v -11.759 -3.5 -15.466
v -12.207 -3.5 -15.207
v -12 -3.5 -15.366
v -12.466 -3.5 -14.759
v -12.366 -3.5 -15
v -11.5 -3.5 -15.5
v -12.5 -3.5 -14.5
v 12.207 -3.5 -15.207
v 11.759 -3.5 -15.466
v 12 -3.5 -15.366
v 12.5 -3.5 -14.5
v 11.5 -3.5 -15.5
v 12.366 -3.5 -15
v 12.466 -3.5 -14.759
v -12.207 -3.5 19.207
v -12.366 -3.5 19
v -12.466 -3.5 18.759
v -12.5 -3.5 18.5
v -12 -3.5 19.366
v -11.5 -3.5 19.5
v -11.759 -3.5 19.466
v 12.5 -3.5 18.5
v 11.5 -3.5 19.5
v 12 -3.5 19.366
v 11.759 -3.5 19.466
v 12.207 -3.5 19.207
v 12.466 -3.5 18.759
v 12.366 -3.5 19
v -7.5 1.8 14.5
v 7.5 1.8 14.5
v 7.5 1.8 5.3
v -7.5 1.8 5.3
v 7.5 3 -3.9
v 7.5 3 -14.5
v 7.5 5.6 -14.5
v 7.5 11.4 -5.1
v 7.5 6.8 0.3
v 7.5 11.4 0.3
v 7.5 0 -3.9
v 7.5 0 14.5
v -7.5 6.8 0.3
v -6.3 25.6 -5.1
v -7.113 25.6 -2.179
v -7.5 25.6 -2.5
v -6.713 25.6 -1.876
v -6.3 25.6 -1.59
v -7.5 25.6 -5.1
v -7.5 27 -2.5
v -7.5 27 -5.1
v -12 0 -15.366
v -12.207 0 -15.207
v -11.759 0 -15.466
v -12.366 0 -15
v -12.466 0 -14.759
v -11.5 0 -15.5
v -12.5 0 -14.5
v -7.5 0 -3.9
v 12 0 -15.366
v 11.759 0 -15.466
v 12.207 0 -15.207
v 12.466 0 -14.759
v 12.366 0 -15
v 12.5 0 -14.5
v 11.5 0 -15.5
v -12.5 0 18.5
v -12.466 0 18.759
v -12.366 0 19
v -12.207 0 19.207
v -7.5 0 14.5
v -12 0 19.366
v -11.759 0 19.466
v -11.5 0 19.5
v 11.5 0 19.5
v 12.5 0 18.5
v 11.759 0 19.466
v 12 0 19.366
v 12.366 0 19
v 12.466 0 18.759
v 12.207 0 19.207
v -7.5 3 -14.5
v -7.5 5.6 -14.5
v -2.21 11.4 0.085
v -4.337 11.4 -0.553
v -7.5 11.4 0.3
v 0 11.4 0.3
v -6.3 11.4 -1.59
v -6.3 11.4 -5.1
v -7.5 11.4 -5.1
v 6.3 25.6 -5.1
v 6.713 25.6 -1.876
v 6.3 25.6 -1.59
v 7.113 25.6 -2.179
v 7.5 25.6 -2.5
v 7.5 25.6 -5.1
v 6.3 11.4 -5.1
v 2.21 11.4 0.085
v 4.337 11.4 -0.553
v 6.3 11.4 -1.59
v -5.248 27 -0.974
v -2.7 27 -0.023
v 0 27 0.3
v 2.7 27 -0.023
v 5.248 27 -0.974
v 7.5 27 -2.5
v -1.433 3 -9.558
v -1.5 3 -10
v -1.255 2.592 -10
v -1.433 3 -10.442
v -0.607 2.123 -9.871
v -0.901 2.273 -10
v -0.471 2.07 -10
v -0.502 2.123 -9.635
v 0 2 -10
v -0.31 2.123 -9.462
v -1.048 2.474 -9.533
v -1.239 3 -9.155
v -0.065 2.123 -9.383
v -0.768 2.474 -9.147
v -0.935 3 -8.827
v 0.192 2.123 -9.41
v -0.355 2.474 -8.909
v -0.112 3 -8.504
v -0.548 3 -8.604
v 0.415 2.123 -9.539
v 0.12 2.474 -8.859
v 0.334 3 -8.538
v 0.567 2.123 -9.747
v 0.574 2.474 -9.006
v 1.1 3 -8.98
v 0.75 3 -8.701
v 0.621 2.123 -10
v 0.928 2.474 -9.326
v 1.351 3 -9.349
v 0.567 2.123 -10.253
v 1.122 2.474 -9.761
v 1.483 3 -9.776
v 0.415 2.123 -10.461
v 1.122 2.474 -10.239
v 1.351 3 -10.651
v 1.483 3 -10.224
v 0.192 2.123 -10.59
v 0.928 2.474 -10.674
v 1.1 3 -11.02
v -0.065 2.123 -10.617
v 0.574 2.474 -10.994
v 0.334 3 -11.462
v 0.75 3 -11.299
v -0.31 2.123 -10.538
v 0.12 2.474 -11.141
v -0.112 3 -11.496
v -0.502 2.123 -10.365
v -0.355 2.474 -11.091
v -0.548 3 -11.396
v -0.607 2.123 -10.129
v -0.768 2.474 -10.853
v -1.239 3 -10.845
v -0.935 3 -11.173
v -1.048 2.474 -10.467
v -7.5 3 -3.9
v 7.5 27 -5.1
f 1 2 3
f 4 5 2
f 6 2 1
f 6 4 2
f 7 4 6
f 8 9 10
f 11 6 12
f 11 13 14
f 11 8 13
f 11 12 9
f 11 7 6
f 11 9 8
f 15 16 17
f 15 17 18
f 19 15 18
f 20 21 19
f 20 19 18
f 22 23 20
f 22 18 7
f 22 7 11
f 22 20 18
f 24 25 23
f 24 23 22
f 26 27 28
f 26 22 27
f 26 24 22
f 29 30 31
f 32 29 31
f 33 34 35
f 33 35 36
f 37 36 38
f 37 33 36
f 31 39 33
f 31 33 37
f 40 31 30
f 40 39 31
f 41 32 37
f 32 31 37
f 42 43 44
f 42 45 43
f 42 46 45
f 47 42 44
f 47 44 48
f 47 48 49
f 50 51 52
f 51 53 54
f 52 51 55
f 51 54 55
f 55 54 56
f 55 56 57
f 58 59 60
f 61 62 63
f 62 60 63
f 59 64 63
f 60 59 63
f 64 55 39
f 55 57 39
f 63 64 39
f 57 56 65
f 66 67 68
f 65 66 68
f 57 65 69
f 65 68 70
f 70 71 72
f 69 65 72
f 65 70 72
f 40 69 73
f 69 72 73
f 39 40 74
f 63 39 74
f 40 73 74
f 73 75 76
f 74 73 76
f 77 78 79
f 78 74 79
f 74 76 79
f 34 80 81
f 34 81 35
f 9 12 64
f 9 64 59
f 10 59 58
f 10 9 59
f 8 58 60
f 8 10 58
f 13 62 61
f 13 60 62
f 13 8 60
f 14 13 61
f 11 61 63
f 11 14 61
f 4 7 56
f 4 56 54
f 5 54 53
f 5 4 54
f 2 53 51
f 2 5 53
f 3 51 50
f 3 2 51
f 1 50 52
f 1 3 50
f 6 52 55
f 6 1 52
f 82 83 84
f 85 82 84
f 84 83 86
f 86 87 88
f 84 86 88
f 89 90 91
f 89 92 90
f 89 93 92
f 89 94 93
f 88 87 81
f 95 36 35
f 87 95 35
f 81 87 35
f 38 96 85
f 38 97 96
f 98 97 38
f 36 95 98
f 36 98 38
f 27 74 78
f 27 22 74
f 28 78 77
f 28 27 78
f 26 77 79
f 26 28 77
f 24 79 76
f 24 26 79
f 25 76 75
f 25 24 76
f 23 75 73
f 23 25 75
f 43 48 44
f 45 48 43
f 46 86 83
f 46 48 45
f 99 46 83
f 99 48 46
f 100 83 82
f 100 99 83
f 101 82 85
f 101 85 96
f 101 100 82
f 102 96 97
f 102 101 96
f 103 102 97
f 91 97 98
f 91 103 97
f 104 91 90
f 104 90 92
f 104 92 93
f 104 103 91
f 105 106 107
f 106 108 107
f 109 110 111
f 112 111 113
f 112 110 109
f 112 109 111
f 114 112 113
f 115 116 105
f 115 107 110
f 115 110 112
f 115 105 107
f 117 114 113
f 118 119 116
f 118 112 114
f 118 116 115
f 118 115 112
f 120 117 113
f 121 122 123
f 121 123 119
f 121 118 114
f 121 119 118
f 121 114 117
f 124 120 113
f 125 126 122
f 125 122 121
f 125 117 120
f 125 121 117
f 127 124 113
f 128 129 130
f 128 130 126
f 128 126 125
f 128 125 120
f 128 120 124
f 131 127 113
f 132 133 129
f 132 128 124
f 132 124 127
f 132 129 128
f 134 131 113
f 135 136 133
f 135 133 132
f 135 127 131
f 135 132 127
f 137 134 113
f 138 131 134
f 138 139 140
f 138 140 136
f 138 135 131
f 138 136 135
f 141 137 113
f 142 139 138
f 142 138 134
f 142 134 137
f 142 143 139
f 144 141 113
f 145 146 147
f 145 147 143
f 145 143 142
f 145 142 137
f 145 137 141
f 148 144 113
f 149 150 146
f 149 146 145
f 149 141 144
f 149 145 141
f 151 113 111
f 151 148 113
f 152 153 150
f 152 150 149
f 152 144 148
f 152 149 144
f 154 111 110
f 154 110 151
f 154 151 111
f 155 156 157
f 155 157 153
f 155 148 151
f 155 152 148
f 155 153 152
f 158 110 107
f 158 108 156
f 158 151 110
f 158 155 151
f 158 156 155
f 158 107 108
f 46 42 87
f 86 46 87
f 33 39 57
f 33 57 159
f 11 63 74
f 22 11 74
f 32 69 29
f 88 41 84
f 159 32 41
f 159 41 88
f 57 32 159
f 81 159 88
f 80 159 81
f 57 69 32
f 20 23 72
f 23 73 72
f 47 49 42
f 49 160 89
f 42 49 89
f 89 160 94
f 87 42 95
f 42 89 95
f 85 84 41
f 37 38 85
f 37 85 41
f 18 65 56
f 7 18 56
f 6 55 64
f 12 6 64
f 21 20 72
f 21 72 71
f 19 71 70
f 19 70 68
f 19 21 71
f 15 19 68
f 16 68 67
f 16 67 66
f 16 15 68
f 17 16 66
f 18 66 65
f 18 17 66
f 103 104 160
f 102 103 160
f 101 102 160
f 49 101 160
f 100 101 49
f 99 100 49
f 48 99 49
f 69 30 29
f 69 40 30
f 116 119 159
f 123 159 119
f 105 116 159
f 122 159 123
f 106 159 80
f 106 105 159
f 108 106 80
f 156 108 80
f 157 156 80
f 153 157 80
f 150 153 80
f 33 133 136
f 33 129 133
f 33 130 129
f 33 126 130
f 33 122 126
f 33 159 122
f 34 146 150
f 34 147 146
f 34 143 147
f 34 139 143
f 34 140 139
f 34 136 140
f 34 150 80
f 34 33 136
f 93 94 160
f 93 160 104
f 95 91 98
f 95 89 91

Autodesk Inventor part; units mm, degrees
ref_plane "YZ Plane" through (0, 0, 0) normal (1, 0, 0) x (0, 1, 0)
ref_plane "XZ Plane" through (0, 0, 0) normal (0, 1, 0) x (-1, 0, 0)
sketch "Эскиз1" plane through (0, 0, 0) normal (0, 1, 0) x (-1, 0, 0)
  line L0 (-7.5, 14.5) -> (7.5, 14.5)
  line L1 (7.5, 14.5) -> (7.5, -14.5)
  line L2 (7.5, -14.5) -> (-7.5, -14.5)
  line L3 (-7.5, -14.5) -> (-7.5, 14.5)
  line L4 (-7.5, 14.5) -> (7.5, -14.5) construction
  line L5 (7.5, 14.5) -> (-7.5, -14.5) construction
  point P0 (0, 0)
  dimension "d0" = 15
  dimension "d1" = 29
extrude "Выдавливание1" add sketch "Эскиз1" along normal blind 27
sketch "Эскиз2" plane through (0, 0, 0) normal (0, -1, 0) x (1, 0, 0)
  line L0 (12.5, 19.5) -> (-12.5, 19.5)
  line L1 (-12.5, 19.5) -> (-12.5, -15.5)
  line L2 (-12.5, -15.5) -> (12.5, -15.5)
  line L3 (12.5, -15.5) -> (12.5, 19.5)
  line L4 (7.5, 14.5) -> (7.5, -14.5) projected
  line L5 (-7.5, 14.5) -> (7.5, 14.5) projected
  point P0 (0, 0)
  dimension "d4" = 25
  dimension "d5" = 35
  dimension "d6" = 5
  dimension "d7" = 5
extrude "Выдавливание2" add sketch "Эскиз2" along normal blind 3.5
fillet "Сопряжение1" radius 1 1 edges at (-12.5, -1.75, 19.5)
fillet "Сопряжение2" radius 1 2 edges at (12.5, -1.75, 19.5) (12.5, -1.75, -15.5)
fillet "Сопряжение3" radius 1 1 edges at (-12.5, -1.75, -15.5)
sketch "Эскиз3" plane through (7.5, 27, 14.5) normal (1, 0, 0) x (0, 0, -1)
  line L0 (14.2, 0) -> (14.2, -20.2)
  line L1 (0, -27) -> (0, 0) projected
  line L2 (0, 0) -> (29, 0) projected
  line L3 (29, -27) -> (-4, -27) projected
  line L4 (-4, -27) -> (29, -27) projected
  line L5 (18.4, -27) -> (18.4, -24)
  line L6 (18.4, -24) -> (29, -24)
  line L7 (29, -27) -> (29, 0) projected
  line L8 (29, 0) -> (0, 0) projected
  line L9 (19.6, 0) -> (19.6, -15.6)
  line L10 (19.6, -15.6) -> (29, -21.4)
  line L11 (0, -25.2) -> (9.2, -25.2)
  line L12 (9.2, -25.2) -> (14.2, -20.2)
  point P0 (14.5, -27)
  dimension "d17" = 3
  dimension "d18" = 9.4
  dimension "d43" = 5
extrude "Выдавливание3" cut sketch "Эскиз3" against normal blind 23 contours L0 L12 L11 L1 L2 | L2 L7 L10 L9 | L5 L6 L7 L3
sketch "Эскиз5" plane through (0, 27, 0) normal (0, 1, 0) x (1, 0, 0)
  line L0 (-7.5, 3.9) -> (-7.5, -14.5) projected
  line L1 (7.5, -14.5) -> (7.5, 3.9) projected
  arc A0 (-7.5, 2.5) -> (7.5, 2.5) centre (0, 11.1446) ccw
  line L2 (-7.5, -0.3) -> (7.5, -0.3) projected
  line L3 (7.5, 5.1) -> (-7.5, 5.1) projected
  point P0 (0, 0)
  point P1 (0, -0.3)
  dimension "d23" = 2.6
  dimension "d24" = 2.6
extrude "Выдавливание4" cut sketch "Эскиз5" against normal blind 15.6
sketch "Эскиз6" plane through (7.5, 11.4, -5.1) normal (0, 0, -1) x (-1, 0, 0)
  line L0 (0, 0) -> (0, 15.6) projected
  line L1 (0, 15.6) -> (15, 15.6) projected
  line L2 (0, 14.2) -> (1.2, 14.2)
  line L3 (1.2, 14.2) -> (1.2, 0)
  line L4 (1.2, 0) -> (0, 0)
  line L5 (0, 0) -> (0, 14.2)
  line L6 (15, 0) -> (15, 15.6)
  line L7 (13.8, 14.2) -> (13.8, 0)
  line L8 (13.8, 0) -> (15, 0)
  line L9 (0, 14.2) -> (1.2, 14.2)
  line L10 (13.8, 14.2) -> (15.1024, 14.2)
  point P0 (7.5, -11.4)
  point P1 (15, 14.2)
  dimension "d28" = 1.2
extrude "Выдавливание5" cut sketch "Эскиз6" against normal blind 16
sketch "Эскиз7" plane through (7.5, 3, -14.5) normal (0, -1, 0) x (1, 0, 0)
  line L0 (0, 0) -> (0, 9.4) projected
  line L1 (0, 4.5) -> (-15, 4.5)
  line L2 (-15, 0) -> (-15, 10.6) projected
  line L3 (0, 0) -> (-15, 0) projected
  point P0 (-7.5, 14.5)
  dimension "d36" = 4.5
ref_plane "РабПлоскость1" through (-7.5, 3, -10) normal (0, 0, -1) x (-1, 0, 0)
sketch "Эскиз8" plane through (-7.5, 3, -10) normal (0, 0, -1) x (-1, 0, 0)
  line L0 (-15, 0) -> (0, 0) projected
  arc A0 (-7.5, -1) -> (-6, 0) centre (-7.5, 0.625) ccw
  line L1 (-15, 0) -> (0, 0) projected
  line L2 (-7.5, 0) -> (-7.5, -1.5688)
  point P0 (-7.5, -3)
  point P1 (-9, 0)
revolve "Вращение2" add sketch "Эскиз8" angle 360 about axis through (0, 3, -10) along (0, -1, 0)
properties part number "stopper"
